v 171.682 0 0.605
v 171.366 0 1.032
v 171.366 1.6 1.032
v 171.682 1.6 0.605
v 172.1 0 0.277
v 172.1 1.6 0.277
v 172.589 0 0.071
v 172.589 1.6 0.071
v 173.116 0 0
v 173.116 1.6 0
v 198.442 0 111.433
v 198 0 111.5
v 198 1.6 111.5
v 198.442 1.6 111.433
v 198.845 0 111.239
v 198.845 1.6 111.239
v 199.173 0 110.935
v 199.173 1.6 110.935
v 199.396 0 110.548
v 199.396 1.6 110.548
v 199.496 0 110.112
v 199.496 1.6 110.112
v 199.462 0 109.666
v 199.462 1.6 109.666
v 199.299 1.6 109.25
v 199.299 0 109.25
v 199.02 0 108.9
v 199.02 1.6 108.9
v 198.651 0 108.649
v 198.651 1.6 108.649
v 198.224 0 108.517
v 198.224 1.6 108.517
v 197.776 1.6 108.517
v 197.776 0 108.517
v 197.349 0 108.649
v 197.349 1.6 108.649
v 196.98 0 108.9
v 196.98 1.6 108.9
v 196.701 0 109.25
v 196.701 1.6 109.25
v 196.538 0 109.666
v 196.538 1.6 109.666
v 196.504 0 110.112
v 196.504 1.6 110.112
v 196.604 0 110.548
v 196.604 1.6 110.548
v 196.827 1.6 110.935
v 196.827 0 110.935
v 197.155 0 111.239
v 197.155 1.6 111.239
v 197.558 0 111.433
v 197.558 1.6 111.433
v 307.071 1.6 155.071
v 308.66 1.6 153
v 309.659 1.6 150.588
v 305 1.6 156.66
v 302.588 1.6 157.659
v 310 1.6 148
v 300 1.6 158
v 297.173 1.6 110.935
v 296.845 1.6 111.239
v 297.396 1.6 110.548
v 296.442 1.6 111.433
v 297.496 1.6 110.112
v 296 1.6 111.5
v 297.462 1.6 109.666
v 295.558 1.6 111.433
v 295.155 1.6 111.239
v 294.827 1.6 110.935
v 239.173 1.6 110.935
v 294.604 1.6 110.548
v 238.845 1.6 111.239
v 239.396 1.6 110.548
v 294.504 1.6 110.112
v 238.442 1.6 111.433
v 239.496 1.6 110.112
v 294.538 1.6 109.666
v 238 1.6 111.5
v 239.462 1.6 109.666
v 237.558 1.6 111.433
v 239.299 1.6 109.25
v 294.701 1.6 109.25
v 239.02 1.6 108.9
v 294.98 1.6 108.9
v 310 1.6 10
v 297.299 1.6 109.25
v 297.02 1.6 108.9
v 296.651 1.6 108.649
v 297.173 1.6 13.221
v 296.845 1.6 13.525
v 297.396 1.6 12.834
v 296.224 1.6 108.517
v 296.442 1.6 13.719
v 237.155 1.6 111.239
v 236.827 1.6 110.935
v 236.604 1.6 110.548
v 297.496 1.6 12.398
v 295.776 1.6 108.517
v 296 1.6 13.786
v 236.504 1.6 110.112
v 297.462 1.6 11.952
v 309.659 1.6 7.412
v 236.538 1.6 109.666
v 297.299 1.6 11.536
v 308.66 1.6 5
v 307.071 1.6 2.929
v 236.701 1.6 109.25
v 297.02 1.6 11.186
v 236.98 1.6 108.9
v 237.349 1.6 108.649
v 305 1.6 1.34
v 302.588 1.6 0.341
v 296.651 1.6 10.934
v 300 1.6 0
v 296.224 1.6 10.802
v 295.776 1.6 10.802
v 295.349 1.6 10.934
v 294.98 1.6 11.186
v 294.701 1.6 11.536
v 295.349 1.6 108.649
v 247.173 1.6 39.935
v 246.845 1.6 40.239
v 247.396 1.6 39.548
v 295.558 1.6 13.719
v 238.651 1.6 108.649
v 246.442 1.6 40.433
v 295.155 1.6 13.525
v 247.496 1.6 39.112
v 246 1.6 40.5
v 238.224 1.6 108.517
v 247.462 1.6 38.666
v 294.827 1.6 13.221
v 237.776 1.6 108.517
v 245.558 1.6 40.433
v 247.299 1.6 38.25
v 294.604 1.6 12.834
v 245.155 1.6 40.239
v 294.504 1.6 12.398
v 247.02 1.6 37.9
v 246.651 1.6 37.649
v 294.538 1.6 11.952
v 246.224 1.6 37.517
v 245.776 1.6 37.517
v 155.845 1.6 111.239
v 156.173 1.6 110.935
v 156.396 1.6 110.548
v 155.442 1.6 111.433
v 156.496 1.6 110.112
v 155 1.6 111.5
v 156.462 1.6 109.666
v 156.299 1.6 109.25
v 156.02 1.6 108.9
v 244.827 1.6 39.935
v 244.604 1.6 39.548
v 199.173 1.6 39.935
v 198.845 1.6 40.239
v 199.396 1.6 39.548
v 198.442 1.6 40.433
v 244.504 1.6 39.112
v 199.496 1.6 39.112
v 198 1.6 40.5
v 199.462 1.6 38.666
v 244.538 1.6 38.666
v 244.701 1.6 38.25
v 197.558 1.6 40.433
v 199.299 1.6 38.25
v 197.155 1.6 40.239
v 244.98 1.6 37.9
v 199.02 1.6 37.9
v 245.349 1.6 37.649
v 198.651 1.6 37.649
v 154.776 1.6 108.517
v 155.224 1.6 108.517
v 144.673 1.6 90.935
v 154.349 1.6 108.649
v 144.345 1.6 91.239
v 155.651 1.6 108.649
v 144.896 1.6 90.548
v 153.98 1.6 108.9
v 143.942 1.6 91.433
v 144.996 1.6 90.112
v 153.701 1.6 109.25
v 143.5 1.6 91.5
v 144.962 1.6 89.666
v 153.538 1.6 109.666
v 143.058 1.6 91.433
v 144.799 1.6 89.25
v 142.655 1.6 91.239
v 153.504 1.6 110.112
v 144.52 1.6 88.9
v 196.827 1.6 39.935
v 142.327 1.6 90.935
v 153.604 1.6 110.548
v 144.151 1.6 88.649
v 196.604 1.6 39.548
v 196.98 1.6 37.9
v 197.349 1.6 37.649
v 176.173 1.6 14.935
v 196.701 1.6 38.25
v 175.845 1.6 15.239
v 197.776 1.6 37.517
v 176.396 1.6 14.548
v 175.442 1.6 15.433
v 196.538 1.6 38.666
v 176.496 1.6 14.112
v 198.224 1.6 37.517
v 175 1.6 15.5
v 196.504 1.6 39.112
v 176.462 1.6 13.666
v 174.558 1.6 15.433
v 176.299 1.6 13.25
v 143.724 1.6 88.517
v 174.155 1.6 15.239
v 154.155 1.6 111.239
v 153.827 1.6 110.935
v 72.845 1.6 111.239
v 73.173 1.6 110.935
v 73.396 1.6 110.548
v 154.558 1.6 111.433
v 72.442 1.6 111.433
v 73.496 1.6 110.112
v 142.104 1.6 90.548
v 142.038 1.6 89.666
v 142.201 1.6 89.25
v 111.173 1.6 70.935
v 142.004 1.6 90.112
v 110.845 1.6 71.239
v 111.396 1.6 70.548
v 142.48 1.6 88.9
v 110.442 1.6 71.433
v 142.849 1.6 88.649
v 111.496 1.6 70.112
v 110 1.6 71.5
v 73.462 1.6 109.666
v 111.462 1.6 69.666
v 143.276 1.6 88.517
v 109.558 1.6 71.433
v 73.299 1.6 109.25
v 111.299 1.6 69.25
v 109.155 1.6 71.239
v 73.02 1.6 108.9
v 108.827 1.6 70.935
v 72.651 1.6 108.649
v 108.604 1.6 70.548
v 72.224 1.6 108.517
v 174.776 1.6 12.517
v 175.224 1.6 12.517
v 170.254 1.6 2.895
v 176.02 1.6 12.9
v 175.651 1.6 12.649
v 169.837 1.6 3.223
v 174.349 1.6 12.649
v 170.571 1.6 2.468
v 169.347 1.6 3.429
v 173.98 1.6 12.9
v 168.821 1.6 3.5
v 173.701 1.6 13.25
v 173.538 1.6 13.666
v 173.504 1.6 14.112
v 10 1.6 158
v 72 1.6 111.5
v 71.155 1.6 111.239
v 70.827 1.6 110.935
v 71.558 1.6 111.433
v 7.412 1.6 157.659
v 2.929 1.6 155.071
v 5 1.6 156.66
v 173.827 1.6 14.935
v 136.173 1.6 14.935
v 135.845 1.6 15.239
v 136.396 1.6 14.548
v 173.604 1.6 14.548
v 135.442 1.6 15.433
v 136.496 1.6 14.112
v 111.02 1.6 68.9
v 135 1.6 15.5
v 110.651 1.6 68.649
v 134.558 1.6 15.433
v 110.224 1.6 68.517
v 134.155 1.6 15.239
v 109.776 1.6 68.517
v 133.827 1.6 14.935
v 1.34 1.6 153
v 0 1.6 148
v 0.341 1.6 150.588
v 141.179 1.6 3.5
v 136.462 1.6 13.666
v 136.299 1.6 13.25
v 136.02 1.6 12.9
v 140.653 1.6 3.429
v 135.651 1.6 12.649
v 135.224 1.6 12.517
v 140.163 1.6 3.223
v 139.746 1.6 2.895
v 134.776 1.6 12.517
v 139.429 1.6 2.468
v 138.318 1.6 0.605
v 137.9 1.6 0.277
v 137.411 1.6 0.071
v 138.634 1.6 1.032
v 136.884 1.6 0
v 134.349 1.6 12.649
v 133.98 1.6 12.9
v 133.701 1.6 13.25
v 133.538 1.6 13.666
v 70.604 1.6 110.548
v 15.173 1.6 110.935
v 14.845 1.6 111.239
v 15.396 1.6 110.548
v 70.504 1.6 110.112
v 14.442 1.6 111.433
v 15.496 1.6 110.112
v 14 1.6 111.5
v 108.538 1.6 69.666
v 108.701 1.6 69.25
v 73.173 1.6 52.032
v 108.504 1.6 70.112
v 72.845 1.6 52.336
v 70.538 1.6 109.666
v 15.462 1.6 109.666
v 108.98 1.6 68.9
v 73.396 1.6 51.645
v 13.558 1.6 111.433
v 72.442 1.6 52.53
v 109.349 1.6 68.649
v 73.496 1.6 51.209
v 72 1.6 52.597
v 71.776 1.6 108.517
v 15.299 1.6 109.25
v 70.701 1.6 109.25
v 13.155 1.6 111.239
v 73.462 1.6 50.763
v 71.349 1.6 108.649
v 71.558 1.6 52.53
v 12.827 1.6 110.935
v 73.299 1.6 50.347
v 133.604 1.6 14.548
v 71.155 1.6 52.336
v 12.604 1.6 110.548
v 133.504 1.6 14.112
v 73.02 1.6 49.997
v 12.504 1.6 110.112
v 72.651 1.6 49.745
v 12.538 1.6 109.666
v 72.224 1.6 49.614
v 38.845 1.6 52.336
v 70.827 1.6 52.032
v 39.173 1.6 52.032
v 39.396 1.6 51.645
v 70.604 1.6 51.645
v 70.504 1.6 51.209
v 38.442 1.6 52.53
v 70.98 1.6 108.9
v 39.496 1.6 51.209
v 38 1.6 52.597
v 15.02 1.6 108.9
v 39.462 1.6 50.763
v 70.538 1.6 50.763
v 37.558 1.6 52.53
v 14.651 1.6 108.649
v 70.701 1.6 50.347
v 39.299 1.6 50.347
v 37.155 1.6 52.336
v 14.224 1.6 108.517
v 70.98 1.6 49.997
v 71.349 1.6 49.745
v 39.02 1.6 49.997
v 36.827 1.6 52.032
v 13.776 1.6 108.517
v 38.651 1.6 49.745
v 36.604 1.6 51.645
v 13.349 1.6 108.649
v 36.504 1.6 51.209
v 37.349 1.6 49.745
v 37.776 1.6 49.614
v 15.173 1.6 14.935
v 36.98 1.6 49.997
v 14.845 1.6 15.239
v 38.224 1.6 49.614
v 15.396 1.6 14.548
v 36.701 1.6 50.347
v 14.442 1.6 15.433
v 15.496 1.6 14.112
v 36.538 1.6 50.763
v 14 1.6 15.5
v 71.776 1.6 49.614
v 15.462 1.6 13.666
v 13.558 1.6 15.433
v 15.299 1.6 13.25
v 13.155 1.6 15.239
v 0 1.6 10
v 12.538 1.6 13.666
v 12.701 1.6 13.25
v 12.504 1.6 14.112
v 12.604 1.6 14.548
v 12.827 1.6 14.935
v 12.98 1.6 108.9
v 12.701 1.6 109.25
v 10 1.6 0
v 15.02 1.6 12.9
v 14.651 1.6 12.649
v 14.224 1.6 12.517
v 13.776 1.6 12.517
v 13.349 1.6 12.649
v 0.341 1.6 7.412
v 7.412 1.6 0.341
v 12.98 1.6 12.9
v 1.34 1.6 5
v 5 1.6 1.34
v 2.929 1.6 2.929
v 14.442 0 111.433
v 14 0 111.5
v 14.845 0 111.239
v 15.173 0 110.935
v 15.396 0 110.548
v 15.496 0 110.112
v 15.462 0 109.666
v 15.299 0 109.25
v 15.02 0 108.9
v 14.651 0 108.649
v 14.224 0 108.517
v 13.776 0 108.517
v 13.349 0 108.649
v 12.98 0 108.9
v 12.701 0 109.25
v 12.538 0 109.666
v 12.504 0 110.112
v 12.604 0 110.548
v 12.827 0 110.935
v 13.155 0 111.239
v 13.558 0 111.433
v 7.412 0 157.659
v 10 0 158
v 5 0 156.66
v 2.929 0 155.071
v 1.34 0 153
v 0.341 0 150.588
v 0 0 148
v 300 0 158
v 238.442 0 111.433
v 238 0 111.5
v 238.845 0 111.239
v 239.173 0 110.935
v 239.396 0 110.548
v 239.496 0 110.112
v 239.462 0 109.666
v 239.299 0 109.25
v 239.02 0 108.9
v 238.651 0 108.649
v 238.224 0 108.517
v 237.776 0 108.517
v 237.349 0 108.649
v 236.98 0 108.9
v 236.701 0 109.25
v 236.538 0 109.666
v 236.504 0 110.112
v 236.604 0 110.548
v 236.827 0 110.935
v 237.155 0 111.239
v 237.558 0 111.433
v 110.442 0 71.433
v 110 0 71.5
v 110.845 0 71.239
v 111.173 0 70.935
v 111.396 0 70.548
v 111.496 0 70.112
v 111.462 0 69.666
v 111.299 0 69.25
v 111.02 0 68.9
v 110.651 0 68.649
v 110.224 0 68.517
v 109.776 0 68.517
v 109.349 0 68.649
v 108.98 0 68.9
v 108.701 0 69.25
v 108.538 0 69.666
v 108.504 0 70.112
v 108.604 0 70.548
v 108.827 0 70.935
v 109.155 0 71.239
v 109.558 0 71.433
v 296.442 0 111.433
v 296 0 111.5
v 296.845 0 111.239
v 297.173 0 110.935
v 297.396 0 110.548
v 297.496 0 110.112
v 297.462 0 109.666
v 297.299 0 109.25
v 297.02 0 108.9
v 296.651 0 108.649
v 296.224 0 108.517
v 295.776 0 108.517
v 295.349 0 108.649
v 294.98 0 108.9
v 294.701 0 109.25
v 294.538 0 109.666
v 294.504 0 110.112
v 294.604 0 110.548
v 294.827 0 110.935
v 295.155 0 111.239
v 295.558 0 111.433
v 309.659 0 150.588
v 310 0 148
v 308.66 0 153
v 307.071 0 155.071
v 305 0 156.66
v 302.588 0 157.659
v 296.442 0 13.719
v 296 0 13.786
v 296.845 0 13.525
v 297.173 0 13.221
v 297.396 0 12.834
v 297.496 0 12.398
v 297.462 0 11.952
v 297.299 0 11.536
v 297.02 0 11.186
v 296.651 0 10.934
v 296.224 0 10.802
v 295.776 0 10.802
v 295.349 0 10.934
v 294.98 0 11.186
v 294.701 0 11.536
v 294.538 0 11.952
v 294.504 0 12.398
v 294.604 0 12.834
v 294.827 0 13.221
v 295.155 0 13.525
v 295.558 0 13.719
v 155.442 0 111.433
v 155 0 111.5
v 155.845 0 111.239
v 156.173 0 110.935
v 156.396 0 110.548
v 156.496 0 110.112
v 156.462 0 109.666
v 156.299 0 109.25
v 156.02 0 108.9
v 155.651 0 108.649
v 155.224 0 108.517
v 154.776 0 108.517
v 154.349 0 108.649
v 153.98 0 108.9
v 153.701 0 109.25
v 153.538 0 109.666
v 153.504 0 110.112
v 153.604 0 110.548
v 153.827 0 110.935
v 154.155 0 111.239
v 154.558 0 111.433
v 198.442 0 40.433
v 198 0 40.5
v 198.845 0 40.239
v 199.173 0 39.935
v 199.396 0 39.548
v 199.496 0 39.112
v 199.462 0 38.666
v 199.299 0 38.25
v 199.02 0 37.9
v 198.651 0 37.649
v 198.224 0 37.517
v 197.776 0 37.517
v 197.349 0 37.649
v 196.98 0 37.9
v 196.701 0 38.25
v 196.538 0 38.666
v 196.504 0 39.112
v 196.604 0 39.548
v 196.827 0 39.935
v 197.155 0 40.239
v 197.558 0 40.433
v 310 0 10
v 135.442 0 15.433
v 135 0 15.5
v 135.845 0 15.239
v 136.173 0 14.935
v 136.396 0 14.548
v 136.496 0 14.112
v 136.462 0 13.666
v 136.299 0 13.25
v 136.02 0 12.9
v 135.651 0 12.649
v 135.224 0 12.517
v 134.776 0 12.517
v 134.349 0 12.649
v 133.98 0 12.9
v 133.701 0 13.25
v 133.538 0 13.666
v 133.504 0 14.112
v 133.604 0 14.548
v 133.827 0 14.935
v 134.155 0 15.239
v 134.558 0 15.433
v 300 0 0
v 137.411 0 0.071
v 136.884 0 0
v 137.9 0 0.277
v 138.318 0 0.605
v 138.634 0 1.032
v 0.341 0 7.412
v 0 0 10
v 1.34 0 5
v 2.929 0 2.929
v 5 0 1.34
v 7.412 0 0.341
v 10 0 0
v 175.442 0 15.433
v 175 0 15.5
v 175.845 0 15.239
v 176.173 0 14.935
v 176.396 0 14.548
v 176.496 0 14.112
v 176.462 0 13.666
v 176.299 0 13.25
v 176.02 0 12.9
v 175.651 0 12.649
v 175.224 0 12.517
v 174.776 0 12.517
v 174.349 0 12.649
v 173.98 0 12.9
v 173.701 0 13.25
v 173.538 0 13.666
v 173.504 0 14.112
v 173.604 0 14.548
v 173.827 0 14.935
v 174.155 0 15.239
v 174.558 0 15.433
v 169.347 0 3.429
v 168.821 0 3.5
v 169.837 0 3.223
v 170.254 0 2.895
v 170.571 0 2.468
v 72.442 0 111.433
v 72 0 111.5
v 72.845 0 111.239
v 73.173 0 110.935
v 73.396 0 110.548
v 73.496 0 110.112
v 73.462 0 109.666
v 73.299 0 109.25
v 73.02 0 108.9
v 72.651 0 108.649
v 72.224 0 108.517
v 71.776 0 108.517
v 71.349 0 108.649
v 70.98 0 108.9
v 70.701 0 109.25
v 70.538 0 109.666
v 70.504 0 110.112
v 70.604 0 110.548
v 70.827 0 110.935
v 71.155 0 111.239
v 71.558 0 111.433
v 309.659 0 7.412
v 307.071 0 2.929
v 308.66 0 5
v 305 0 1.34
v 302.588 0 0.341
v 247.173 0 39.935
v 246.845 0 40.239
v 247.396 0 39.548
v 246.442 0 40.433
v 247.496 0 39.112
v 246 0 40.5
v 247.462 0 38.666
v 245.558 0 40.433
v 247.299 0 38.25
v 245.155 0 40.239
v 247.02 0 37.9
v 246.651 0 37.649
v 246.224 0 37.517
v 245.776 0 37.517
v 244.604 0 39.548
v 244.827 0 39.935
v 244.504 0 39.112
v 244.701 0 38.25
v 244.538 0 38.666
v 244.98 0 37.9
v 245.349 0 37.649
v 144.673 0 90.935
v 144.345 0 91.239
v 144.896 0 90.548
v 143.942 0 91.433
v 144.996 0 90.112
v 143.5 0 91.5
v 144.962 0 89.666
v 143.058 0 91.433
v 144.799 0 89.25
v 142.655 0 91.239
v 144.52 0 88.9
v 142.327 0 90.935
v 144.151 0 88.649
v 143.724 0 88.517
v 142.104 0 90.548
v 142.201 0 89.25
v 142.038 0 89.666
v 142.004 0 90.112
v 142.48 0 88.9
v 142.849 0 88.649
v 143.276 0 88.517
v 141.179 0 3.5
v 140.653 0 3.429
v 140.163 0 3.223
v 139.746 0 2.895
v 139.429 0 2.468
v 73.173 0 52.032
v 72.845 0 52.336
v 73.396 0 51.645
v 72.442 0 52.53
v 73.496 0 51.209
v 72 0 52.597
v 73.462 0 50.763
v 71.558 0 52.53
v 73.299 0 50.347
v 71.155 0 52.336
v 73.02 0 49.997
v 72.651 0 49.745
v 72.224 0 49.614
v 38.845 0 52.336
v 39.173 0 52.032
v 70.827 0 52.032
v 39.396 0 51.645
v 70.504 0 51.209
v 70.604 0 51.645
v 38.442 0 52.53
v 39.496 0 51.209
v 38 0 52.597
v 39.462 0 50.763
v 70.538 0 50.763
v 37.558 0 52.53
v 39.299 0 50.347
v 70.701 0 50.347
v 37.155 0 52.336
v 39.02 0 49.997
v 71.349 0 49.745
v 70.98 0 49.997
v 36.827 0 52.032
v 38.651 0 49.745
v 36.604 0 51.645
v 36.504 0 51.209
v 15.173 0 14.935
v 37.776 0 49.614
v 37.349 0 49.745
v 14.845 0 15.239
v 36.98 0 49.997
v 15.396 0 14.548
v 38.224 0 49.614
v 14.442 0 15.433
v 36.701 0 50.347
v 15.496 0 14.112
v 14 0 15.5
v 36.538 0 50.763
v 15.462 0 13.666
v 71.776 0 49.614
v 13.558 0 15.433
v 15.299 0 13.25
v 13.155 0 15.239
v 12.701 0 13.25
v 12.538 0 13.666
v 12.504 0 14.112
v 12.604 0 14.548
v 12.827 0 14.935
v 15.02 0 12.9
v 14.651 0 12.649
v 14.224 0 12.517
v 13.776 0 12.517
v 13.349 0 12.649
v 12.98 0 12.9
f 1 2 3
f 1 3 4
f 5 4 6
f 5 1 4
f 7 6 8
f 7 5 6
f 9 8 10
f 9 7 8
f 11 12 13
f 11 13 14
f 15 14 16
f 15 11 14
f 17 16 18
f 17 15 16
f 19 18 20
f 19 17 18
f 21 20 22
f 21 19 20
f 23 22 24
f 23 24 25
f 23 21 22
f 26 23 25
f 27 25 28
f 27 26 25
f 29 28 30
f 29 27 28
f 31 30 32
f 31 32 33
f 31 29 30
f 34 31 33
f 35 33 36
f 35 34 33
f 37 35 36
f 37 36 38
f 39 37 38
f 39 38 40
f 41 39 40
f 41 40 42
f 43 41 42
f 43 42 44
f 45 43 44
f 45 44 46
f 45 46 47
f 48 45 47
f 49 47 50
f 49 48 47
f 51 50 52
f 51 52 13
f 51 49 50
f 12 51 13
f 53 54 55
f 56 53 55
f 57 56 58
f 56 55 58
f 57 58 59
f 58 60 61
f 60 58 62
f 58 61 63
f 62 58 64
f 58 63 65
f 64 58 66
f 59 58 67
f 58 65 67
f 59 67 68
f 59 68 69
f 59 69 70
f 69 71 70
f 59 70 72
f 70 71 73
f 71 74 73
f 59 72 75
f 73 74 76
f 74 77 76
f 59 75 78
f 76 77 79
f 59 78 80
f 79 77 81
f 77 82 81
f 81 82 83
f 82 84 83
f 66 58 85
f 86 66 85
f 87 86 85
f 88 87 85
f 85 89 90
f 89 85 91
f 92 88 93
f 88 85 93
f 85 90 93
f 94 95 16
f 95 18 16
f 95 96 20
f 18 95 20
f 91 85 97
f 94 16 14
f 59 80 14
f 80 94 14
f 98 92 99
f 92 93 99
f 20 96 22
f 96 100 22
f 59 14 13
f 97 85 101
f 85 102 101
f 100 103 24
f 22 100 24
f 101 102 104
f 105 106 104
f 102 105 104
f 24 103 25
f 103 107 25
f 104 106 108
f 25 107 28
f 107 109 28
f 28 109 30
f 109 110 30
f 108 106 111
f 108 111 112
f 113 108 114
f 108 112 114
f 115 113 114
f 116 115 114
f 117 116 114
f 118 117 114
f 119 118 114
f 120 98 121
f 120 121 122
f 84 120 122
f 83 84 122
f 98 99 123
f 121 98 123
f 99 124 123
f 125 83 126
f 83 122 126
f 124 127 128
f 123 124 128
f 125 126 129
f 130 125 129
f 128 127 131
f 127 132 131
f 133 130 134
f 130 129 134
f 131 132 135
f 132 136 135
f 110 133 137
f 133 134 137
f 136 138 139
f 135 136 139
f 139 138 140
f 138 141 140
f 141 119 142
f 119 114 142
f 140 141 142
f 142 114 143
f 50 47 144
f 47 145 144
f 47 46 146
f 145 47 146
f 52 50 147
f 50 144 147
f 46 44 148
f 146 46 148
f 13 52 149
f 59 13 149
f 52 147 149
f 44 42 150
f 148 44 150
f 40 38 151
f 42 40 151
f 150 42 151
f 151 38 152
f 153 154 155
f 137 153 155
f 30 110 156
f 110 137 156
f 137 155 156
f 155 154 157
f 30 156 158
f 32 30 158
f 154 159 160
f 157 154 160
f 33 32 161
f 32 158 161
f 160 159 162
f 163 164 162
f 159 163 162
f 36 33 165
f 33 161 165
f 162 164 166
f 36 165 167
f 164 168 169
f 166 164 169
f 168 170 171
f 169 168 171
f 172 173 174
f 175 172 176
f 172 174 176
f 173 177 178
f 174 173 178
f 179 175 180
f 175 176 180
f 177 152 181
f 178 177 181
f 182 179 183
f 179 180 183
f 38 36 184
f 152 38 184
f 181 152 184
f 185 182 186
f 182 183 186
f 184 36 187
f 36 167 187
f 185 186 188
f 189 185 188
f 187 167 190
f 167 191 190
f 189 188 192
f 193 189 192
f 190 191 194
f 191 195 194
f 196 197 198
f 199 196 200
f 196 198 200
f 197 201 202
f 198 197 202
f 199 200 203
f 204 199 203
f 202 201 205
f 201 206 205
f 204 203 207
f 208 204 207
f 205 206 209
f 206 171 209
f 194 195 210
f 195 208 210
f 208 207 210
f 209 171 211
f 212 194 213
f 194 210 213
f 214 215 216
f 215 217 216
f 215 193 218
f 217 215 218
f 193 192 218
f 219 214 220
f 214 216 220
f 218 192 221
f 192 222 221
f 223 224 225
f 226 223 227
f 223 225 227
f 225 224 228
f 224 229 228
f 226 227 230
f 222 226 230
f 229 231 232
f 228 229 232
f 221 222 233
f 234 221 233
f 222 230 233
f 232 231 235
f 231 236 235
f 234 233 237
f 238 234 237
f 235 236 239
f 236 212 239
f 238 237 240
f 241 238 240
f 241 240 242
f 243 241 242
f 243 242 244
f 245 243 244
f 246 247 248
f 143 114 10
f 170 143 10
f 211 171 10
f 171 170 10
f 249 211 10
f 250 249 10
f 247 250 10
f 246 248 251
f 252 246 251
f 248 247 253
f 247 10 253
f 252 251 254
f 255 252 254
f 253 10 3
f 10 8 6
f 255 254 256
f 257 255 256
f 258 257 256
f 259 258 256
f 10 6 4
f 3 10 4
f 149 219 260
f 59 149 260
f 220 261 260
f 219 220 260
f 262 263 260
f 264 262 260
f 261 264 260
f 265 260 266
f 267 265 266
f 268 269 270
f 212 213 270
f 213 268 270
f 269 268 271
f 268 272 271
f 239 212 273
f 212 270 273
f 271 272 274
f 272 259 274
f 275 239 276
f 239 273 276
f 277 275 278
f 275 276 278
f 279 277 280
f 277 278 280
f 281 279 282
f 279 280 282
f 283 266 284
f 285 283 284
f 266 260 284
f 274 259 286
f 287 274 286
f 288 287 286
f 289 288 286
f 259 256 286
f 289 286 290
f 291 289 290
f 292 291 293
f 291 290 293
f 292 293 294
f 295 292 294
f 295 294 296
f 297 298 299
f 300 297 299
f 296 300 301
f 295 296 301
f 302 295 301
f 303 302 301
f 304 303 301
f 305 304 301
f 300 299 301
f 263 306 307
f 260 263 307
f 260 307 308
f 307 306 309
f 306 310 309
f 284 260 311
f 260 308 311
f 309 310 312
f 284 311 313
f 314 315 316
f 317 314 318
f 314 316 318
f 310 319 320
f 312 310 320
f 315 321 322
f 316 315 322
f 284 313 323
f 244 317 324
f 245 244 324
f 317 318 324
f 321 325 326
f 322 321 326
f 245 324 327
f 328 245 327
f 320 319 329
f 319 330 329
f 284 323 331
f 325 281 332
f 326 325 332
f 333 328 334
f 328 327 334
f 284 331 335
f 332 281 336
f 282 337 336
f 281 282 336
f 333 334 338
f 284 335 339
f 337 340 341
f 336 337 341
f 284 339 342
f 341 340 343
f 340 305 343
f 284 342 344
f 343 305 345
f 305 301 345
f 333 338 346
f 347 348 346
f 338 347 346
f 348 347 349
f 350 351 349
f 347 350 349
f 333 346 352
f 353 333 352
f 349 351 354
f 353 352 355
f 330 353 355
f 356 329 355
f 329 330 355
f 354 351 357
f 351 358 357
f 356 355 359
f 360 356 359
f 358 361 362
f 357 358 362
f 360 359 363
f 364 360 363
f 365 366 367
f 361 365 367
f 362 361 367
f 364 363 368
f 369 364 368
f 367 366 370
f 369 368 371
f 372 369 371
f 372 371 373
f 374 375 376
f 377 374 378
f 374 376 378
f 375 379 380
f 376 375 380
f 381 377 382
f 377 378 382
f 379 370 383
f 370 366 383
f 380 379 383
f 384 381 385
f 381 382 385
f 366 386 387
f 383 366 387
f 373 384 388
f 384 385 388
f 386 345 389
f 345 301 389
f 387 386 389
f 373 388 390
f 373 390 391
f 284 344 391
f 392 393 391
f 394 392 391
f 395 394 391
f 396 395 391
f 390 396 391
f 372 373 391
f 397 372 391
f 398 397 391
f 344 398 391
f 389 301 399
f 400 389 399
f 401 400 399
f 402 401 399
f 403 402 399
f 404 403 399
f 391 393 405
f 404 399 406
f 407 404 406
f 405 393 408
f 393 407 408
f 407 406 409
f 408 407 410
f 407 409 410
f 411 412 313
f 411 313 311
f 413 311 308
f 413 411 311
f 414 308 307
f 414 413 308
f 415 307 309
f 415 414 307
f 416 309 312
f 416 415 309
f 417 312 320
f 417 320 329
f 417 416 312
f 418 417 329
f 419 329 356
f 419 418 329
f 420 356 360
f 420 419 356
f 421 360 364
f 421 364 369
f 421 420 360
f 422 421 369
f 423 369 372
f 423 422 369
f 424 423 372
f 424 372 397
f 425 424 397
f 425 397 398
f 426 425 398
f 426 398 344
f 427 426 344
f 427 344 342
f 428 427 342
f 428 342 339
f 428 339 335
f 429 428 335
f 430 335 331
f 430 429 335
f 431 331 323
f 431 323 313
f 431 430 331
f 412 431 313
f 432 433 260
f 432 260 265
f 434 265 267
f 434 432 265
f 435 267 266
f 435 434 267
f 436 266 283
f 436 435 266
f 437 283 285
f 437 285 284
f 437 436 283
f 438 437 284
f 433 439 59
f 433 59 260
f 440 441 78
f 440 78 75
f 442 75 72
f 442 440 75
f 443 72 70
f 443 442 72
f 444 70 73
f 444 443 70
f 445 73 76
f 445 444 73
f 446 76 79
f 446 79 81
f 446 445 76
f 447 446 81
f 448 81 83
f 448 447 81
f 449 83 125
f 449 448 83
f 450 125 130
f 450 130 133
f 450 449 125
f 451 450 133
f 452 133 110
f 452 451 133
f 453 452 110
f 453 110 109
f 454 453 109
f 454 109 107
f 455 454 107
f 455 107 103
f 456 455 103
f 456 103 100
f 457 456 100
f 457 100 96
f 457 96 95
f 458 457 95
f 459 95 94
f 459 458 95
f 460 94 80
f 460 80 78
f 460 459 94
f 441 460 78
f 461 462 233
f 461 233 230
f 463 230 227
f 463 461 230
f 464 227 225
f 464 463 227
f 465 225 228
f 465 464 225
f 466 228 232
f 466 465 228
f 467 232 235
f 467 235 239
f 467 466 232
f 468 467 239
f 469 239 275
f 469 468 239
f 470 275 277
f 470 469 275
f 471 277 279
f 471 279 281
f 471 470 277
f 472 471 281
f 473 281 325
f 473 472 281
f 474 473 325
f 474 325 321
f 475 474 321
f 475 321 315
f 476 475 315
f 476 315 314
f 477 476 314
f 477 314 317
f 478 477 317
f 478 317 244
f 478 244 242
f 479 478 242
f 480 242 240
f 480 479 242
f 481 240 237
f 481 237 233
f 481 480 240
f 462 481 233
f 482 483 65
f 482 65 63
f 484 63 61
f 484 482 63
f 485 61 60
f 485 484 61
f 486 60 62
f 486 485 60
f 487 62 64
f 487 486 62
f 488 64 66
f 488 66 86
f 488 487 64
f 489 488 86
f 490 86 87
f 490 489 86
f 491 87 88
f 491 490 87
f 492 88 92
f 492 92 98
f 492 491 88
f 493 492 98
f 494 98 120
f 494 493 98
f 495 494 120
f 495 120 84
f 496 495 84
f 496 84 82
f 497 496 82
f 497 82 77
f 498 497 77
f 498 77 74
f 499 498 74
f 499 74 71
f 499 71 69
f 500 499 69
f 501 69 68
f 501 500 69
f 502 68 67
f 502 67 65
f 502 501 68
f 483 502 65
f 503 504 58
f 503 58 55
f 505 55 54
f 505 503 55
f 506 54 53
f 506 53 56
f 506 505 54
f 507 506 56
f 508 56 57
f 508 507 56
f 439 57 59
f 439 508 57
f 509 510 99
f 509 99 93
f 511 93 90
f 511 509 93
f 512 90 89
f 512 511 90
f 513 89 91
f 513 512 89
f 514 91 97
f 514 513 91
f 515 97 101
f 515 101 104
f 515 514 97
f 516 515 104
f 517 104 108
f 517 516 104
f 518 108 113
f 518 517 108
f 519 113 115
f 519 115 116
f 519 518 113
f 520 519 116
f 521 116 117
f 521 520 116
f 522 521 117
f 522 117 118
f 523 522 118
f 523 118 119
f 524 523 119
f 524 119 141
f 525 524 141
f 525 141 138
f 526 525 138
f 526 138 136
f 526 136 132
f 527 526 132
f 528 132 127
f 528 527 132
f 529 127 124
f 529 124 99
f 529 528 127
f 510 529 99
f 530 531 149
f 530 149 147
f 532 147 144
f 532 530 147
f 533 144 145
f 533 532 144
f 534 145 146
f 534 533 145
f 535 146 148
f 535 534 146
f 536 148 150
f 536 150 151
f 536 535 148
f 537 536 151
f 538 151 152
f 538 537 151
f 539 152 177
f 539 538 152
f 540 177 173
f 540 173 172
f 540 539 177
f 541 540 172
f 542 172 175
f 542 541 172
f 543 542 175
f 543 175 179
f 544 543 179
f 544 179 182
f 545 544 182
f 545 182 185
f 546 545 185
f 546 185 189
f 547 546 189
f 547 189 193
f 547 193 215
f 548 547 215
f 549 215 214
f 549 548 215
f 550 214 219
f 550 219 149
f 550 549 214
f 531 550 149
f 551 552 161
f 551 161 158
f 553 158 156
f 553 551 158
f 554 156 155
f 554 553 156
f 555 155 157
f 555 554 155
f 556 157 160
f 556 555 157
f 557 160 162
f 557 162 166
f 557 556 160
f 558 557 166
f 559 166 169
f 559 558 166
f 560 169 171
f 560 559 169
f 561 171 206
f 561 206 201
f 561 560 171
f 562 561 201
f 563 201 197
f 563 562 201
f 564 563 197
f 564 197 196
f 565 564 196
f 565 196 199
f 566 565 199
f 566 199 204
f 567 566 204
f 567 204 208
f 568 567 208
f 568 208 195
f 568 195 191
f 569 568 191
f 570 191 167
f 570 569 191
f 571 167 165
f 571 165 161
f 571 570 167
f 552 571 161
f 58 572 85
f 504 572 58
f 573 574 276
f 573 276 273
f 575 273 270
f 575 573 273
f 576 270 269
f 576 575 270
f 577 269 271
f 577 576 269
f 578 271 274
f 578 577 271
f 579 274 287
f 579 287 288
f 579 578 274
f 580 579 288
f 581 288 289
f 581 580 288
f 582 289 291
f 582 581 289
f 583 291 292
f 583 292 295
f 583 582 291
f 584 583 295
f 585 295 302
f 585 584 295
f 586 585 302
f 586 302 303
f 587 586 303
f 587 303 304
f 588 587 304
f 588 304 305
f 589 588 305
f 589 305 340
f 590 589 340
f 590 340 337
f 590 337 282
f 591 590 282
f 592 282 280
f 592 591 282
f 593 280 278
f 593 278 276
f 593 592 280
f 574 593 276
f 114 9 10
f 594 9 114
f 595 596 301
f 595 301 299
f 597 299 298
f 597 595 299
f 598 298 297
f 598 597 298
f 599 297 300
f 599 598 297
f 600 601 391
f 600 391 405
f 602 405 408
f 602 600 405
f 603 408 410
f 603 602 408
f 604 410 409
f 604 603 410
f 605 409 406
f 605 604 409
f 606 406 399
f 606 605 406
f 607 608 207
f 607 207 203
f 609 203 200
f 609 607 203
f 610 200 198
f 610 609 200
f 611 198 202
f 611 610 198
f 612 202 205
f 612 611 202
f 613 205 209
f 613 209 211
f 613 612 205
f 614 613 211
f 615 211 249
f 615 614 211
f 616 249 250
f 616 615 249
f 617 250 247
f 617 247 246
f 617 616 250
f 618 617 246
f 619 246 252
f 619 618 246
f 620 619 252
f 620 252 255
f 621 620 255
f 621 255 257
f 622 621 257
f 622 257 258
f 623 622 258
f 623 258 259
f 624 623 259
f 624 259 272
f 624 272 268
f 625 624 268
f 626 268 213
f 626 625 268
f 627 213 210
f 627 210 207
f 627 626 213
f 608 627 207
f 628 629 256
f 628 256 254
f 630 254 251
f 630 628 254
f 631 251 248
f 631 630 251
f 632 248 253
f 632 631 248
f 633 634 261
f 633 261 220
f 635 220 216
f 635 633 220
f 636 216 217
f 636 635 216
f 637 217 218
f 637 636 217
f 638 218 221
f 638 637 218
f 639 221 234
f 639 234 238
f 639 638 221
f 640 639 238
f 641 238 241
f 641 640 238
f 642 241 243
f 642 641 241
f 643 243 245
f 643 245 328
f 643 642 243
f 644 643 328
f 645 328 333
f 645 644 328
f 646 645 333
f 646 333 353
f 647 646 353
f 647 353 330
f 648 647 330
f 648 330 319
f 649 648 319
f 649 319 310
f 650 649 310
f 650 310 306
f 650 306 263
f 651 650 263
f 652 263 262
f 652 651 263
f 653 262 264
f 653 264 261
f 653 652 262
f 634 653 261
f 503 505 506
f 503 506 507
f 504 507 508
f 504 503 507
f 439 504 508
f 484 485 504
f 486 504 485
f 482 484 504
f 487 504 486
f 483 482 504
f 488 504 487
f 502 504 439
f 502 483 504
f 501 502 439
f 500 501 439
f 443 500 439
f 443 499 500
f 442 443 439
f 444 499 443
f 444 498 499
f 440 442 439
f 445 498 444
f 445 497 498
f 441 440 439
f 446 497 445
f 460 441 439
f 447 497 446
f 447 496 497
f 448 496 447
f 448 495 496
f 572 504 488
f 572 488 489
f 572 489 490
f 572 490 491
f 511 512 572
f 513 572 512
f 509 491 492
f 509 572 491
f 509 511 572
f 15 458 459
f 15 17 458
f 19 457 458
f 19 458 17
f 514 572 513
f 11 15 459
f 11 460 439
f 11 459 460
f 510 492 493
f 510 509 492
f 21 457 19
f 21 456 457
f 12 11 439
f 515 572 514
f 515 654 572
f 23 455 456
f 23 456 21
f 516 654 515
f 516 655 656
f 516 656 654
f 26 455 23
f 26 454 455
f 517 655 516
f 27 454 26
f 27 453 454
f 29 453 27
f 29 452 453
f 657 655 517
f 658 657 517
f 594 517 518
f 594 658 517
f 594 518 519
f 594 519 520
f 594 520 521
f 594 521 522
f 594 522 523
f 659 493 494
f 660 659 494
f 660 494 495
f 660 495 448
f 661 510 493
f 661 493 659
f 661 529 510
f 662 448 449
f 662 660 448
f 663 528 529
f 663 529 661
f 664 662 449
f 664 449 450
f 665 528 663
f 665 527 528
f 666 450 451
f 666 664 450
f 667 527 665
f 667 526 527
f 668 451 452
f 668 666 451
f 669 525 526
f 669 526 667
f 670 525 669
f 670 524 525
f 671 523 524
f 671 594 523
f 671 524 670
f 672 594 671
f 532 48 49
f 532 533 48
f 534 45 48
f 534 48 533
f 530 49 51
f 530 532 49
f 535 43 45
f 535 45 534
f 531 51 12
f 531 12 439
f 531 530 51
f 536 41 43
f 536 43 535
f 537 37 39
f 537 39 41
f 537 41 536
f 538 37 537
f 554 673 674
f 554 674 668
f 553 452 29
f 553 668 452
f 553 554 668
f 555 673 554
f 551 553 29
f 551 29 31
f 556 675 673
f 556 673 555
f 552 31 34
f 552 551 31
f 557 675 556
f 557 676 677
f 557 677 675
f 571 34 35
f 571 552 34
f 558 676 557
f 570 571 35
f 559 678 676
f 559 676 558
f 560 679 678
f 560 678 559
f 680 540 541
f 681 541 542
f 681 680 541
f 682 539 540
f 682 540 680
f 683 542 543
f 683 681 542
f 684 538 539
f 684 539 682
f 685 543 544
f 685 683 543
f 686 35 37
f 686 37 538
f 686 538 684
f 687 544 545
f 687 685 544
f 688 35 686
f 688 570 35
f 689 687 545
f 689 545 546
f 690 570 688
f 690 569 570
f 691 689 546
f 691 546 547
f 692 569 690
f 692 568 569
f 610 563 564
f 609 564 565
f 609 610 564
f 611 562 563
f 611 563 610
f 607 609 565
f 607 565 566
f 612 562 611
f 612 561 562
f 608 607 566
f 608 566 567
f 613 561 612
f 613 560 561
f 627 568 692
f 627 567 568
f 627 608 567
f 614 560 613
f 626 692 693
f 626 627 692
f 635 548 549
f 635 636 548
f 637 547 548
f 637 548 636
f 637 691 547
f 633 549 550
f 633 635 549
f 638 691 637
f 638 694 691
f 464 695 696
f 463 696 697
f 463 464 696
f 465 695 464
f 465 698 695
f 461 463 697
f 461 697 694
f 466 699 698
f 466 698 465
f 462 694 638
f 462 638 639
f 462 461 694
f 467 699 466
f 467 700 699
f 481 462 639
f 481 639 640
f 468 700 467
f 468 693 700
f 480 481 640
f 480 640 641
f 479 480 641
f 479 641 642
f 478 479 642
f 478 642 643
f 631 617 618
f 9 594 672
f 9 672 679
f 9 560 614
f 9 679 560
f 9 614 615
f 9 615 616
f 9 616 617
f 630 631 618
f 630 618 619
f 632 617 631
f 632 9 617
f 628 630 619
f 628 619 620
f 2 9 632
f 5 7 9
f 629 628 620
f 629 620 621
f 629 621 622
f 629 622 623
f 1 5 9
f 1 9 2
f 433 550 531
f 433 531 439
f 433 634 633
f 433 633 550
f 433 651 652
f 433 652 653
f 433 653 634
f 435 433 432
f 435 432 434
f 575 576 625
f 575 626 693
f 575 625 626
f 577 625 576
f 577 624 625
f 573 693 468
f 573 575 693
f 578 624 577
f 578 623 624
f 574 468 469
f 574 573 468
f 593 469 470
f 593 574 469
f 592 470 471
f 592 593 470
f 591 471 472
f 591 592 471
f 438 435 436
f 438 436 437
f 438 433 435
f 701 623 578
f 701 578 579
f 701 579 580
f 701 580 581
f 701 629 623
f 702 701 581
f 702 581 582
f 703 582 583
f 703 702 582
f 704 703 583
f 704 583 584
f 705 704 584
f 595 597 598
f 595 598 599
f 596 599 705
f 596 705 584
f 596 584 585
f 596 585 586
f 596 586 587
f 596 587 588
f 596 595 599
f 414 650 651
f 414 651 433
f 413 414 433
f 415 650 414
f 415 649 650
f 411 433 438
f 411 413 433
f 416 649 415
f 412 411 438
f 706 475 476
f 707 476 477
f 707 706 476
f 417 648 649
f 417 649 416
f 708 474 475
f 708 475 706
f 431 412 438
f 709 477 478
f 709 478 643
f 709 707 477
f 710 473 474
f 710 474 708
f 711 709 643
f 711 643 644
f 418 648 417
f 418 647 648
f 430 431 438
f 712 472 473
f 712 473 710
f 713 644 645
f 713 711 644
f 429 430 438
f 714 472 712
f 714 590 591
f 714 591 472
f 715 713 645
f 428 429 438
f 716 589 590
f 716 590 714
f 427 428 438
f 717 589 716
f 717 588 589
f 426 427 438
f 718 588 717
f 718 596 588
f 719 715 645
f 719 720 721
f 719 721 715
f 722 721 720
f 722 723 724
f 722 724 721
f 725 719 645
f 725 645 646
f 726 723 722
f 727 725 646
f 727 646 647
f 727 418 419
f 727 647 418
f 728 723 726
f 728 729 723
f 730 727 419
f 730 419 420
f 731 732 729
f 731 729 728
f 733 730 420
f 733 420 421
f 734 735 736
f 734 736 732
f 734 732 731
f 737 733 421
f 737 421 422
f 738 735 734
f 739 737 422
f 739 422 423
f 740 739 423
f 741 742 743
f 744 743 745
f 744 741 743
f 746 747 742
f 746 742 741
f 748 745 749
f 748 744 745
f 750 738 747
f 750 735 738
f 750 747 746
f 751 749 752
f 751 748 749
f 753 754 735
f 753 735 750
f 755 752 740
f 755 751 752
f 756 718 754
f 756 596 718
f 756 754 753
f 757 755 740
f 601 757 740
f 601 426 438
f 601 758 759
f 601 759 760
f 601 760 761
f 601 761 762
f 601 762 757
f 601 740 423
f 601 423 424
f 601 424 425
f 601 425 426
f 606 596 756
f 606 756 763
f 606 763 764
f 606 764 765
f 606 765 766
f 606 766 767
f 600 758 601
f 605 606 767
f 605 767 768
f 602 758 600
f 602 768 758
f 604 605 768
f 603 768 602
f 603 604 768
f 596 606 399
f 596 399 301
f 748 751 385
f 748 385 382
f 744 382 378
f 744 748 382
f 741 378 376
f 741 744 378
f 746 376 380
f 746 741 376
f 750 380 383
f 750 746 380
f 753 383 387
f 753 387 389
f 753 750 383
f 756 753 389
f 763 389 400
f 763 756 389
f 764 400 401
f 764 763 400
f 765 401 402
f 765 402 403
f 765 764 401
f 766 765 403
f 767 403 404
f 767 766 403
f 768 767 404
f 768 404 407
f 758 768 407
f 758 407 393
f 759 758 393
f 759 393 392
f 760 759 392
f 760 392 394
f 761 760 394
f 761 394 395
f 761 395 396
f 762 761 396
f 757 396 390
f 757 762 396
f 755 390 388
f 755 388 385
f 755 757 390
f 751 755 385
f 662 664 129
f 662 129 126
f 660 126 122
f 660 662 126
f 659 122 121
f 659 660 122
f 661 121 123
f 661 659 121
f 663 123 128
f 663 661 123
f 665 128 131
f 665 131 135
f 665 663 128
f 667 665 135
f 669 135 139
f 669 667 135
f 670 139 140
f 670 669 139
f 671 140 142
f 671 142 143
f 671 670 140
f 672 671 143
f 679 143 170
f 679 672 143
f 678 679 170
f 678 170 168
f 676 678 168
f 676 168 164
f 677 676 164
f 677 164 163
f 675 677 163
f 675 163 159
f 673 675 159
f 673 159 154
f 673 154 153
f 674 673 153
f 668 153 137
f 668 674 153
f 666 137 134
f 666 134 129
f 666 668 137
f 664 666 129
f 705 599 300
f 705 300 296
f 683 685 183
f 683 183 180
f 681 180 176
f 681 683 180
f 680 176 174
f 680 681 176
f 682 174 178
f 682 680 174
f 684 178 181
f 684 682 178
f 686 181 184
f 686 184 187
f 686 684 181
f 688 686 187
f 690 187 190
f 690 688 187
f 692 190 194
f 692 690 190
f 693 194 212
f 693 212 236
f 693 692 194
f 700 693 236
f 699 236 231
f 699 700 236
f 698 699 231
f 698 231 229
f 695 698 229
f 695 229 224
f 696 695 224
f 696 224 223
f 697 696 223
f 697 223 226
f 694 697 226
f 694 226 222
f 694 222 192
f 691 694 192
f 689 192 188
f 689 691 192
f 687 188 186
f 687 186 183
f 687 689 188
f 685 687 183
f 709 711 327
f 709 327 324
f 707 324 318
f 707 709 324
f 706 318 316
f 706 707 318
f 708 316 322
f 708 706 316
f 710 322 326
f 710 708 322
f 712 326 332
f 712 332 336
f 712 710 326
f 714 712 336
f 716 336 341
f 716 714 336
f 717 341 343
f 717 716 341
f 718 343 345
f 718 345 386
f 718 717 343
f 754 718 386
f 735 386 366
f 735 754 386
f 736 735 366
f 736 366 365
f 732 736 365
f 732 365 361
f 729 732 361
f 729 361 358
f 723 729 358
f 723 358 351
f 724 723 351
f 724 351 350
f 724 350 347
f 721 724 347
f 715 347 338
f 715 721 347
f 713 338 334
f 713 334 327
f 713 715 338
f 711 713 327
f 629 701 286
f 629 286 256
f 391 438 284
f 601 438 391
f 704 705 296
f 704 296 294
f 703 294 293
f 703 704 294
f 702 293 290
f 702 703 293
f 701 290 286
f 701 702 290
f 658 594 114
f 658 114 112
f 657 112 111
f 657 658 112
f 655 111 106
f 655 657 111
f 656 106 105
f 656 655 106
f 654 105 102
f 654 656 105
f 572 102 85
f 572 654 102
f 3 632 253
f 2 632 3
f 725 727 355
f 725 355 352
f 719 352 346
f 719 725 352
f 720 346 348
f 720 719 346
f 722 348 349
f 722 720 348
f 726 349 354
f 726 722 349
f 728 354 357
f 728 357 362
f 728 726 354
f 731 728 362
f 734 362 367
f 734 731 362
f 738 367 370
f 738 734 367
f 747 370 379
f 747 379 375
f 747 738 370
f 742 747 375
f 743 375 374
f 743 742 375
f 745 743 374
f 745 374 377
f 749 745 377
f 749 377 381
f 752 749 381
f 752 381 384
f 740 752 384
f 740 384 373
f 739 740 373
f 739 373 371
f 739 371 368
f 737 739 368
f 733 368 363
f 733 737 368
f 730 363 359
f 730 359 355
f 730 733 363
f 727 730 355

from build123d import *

# Parameters (mm, degrees)
SKETCH_1_R      = 1.5
EXTRUDE_1_DEPTH = 1.6


with BuildPart() as part:
    # 草图1 → 凸台-拉伸1 (new body)
    with BuildSketch(Plane(origin=(0, 0, 0), x_dir=(1, 0, 0), z_dir=(0, 1, 0))):
        with BuildLine():
            Line((10, 0), (136.884360712, 0))
            ThreePointArc((136.884360712, 0), (137.900113715, -0.277140216), (138.634360712, -1.031754163))
            Line((138.634360712, -1.031754163), (139.429147615, -2.468245837))
            ThreePointArc((139.429147615, -2.468245837), (140.163394612, -3.222859784), (141.179147615, -3.5))
            Line((141.179147615, -3.5), (143.5, -3.5))
            Line((143.5, -3.5), (166.5, -3.5))
            Line((166.5, -3.5), (168.820852385, -3.5))
            ThreePointArc((168.820852385, -3.5), (169.836605388, -3.222859784), (170.570852385, -2.468245837))
            Line((170.570852385, -2.468245837), (171.365639288, -1.031754163))
            ThreePointArc((171.365639288, -1.031754163), (172.099886285, -0.277140216), (173.115639288, 0))
            Line((173.115639288, 0), (300, 0))
            ThreePointArc((300, 0), (307.071067812, -2.928932188), (310, -10))
            Line((310, -10), (310, -148))
            ThreePointArc((310, -148), (307.071067812, -155.071067812), (300, -158))
            Line((300, -158), (10, -158))
            ThreePointArc((10, -158), (2.928932188, -155.071067812), (0, -148))
            Line((0, -148), (0, -10))
            ThreePointArc((0, -10), (2.928932188, -2.928932188), (10, 0))
        make_face()
        with Locations(Location((14, -14, 0), (0, 0, 270))):
            Circle(SKETCH_1_R, mode=Mode.SUBTRACT)
        with Locations(Location((296, -12.28568254, 0), (0, 0, 270))):
            Circle(SKETCH_1_R, mode=Mode.SUBTRACT)
        with Locations(Location((175, -14, 0), (0, 0, 270))):
            Circle(SKETCH_1_R, mode=Mode.SUBTRACT)
        with Locations(Location((135, -14, 0), (0, 0, 270))):
            Circle(SKETCH_1_R, mode=Mode.SUBTRACT)
        with Locations(Location((296, -110, 0), (0, 0, 270))):
            Circle(SKETCH_1_R, mode=Mode.SUBTRACT)
        with Locations(Location((14, -110, 0), (0, 0, 270))):
            Circle(SKETCH_1_R, mode=Mode.SUBTRACT)
        with Locations(Location((155, -110, 0), (0, 0, 270))):
            Circle(SKETCH_1_R, mode=Mode.SUBTRACT)
        with Locations(Location((72, -110, 0), (0, 0, 270))):
            Circle(SKETCH_1_R, mode=Mode.SUBTRACT)
        with Locations(Location((72, -51.096774194, 0), (0, 0, 270))):
            Circle(SKETCH_1_R, mode=Mode.SUBTRACT)
        with Locations(Location((238, -110, 0), (0, 0, 270))):
            Circle(SKETCH_1_R, mode=Mode.SUBTRACT)
        with Locations(Location((246, -39, 0), (0, 0, 270))):
            Circle(SKETCH_1_R, mode=Mode.SUBTRACT)
        with Locations(Location((198, -39, 0), (0, 0, 270))):
            Circle(SKETCH_1_R, mode=Mode.SUBTRACT)
        with Locations(Location((110, -70, 0), (0, 0, 270))):
            Circle(SKETCH_1_R, mode=Mode.SUBTRACT)
        with Locations(Location((38, -51.096774194, 0), (0, 0, 270))):
            Circle(SKETCH_1_R, mode=Mode.SUBTRACT)
        with Locations(Location((198, -110, 0), (0, 0, 270))):
            Circle(SKETCH_1_R, mode=Mode.SUBTRACT)
        with Locations(Location((143.5, -90, 0), (0, 0, 270))):
            Circle(SKETCH_1_R, mode=Mode.SUBTRACT)
    extrude(amount=EXTRUDE_1_DEPTH)


solid = part.part
